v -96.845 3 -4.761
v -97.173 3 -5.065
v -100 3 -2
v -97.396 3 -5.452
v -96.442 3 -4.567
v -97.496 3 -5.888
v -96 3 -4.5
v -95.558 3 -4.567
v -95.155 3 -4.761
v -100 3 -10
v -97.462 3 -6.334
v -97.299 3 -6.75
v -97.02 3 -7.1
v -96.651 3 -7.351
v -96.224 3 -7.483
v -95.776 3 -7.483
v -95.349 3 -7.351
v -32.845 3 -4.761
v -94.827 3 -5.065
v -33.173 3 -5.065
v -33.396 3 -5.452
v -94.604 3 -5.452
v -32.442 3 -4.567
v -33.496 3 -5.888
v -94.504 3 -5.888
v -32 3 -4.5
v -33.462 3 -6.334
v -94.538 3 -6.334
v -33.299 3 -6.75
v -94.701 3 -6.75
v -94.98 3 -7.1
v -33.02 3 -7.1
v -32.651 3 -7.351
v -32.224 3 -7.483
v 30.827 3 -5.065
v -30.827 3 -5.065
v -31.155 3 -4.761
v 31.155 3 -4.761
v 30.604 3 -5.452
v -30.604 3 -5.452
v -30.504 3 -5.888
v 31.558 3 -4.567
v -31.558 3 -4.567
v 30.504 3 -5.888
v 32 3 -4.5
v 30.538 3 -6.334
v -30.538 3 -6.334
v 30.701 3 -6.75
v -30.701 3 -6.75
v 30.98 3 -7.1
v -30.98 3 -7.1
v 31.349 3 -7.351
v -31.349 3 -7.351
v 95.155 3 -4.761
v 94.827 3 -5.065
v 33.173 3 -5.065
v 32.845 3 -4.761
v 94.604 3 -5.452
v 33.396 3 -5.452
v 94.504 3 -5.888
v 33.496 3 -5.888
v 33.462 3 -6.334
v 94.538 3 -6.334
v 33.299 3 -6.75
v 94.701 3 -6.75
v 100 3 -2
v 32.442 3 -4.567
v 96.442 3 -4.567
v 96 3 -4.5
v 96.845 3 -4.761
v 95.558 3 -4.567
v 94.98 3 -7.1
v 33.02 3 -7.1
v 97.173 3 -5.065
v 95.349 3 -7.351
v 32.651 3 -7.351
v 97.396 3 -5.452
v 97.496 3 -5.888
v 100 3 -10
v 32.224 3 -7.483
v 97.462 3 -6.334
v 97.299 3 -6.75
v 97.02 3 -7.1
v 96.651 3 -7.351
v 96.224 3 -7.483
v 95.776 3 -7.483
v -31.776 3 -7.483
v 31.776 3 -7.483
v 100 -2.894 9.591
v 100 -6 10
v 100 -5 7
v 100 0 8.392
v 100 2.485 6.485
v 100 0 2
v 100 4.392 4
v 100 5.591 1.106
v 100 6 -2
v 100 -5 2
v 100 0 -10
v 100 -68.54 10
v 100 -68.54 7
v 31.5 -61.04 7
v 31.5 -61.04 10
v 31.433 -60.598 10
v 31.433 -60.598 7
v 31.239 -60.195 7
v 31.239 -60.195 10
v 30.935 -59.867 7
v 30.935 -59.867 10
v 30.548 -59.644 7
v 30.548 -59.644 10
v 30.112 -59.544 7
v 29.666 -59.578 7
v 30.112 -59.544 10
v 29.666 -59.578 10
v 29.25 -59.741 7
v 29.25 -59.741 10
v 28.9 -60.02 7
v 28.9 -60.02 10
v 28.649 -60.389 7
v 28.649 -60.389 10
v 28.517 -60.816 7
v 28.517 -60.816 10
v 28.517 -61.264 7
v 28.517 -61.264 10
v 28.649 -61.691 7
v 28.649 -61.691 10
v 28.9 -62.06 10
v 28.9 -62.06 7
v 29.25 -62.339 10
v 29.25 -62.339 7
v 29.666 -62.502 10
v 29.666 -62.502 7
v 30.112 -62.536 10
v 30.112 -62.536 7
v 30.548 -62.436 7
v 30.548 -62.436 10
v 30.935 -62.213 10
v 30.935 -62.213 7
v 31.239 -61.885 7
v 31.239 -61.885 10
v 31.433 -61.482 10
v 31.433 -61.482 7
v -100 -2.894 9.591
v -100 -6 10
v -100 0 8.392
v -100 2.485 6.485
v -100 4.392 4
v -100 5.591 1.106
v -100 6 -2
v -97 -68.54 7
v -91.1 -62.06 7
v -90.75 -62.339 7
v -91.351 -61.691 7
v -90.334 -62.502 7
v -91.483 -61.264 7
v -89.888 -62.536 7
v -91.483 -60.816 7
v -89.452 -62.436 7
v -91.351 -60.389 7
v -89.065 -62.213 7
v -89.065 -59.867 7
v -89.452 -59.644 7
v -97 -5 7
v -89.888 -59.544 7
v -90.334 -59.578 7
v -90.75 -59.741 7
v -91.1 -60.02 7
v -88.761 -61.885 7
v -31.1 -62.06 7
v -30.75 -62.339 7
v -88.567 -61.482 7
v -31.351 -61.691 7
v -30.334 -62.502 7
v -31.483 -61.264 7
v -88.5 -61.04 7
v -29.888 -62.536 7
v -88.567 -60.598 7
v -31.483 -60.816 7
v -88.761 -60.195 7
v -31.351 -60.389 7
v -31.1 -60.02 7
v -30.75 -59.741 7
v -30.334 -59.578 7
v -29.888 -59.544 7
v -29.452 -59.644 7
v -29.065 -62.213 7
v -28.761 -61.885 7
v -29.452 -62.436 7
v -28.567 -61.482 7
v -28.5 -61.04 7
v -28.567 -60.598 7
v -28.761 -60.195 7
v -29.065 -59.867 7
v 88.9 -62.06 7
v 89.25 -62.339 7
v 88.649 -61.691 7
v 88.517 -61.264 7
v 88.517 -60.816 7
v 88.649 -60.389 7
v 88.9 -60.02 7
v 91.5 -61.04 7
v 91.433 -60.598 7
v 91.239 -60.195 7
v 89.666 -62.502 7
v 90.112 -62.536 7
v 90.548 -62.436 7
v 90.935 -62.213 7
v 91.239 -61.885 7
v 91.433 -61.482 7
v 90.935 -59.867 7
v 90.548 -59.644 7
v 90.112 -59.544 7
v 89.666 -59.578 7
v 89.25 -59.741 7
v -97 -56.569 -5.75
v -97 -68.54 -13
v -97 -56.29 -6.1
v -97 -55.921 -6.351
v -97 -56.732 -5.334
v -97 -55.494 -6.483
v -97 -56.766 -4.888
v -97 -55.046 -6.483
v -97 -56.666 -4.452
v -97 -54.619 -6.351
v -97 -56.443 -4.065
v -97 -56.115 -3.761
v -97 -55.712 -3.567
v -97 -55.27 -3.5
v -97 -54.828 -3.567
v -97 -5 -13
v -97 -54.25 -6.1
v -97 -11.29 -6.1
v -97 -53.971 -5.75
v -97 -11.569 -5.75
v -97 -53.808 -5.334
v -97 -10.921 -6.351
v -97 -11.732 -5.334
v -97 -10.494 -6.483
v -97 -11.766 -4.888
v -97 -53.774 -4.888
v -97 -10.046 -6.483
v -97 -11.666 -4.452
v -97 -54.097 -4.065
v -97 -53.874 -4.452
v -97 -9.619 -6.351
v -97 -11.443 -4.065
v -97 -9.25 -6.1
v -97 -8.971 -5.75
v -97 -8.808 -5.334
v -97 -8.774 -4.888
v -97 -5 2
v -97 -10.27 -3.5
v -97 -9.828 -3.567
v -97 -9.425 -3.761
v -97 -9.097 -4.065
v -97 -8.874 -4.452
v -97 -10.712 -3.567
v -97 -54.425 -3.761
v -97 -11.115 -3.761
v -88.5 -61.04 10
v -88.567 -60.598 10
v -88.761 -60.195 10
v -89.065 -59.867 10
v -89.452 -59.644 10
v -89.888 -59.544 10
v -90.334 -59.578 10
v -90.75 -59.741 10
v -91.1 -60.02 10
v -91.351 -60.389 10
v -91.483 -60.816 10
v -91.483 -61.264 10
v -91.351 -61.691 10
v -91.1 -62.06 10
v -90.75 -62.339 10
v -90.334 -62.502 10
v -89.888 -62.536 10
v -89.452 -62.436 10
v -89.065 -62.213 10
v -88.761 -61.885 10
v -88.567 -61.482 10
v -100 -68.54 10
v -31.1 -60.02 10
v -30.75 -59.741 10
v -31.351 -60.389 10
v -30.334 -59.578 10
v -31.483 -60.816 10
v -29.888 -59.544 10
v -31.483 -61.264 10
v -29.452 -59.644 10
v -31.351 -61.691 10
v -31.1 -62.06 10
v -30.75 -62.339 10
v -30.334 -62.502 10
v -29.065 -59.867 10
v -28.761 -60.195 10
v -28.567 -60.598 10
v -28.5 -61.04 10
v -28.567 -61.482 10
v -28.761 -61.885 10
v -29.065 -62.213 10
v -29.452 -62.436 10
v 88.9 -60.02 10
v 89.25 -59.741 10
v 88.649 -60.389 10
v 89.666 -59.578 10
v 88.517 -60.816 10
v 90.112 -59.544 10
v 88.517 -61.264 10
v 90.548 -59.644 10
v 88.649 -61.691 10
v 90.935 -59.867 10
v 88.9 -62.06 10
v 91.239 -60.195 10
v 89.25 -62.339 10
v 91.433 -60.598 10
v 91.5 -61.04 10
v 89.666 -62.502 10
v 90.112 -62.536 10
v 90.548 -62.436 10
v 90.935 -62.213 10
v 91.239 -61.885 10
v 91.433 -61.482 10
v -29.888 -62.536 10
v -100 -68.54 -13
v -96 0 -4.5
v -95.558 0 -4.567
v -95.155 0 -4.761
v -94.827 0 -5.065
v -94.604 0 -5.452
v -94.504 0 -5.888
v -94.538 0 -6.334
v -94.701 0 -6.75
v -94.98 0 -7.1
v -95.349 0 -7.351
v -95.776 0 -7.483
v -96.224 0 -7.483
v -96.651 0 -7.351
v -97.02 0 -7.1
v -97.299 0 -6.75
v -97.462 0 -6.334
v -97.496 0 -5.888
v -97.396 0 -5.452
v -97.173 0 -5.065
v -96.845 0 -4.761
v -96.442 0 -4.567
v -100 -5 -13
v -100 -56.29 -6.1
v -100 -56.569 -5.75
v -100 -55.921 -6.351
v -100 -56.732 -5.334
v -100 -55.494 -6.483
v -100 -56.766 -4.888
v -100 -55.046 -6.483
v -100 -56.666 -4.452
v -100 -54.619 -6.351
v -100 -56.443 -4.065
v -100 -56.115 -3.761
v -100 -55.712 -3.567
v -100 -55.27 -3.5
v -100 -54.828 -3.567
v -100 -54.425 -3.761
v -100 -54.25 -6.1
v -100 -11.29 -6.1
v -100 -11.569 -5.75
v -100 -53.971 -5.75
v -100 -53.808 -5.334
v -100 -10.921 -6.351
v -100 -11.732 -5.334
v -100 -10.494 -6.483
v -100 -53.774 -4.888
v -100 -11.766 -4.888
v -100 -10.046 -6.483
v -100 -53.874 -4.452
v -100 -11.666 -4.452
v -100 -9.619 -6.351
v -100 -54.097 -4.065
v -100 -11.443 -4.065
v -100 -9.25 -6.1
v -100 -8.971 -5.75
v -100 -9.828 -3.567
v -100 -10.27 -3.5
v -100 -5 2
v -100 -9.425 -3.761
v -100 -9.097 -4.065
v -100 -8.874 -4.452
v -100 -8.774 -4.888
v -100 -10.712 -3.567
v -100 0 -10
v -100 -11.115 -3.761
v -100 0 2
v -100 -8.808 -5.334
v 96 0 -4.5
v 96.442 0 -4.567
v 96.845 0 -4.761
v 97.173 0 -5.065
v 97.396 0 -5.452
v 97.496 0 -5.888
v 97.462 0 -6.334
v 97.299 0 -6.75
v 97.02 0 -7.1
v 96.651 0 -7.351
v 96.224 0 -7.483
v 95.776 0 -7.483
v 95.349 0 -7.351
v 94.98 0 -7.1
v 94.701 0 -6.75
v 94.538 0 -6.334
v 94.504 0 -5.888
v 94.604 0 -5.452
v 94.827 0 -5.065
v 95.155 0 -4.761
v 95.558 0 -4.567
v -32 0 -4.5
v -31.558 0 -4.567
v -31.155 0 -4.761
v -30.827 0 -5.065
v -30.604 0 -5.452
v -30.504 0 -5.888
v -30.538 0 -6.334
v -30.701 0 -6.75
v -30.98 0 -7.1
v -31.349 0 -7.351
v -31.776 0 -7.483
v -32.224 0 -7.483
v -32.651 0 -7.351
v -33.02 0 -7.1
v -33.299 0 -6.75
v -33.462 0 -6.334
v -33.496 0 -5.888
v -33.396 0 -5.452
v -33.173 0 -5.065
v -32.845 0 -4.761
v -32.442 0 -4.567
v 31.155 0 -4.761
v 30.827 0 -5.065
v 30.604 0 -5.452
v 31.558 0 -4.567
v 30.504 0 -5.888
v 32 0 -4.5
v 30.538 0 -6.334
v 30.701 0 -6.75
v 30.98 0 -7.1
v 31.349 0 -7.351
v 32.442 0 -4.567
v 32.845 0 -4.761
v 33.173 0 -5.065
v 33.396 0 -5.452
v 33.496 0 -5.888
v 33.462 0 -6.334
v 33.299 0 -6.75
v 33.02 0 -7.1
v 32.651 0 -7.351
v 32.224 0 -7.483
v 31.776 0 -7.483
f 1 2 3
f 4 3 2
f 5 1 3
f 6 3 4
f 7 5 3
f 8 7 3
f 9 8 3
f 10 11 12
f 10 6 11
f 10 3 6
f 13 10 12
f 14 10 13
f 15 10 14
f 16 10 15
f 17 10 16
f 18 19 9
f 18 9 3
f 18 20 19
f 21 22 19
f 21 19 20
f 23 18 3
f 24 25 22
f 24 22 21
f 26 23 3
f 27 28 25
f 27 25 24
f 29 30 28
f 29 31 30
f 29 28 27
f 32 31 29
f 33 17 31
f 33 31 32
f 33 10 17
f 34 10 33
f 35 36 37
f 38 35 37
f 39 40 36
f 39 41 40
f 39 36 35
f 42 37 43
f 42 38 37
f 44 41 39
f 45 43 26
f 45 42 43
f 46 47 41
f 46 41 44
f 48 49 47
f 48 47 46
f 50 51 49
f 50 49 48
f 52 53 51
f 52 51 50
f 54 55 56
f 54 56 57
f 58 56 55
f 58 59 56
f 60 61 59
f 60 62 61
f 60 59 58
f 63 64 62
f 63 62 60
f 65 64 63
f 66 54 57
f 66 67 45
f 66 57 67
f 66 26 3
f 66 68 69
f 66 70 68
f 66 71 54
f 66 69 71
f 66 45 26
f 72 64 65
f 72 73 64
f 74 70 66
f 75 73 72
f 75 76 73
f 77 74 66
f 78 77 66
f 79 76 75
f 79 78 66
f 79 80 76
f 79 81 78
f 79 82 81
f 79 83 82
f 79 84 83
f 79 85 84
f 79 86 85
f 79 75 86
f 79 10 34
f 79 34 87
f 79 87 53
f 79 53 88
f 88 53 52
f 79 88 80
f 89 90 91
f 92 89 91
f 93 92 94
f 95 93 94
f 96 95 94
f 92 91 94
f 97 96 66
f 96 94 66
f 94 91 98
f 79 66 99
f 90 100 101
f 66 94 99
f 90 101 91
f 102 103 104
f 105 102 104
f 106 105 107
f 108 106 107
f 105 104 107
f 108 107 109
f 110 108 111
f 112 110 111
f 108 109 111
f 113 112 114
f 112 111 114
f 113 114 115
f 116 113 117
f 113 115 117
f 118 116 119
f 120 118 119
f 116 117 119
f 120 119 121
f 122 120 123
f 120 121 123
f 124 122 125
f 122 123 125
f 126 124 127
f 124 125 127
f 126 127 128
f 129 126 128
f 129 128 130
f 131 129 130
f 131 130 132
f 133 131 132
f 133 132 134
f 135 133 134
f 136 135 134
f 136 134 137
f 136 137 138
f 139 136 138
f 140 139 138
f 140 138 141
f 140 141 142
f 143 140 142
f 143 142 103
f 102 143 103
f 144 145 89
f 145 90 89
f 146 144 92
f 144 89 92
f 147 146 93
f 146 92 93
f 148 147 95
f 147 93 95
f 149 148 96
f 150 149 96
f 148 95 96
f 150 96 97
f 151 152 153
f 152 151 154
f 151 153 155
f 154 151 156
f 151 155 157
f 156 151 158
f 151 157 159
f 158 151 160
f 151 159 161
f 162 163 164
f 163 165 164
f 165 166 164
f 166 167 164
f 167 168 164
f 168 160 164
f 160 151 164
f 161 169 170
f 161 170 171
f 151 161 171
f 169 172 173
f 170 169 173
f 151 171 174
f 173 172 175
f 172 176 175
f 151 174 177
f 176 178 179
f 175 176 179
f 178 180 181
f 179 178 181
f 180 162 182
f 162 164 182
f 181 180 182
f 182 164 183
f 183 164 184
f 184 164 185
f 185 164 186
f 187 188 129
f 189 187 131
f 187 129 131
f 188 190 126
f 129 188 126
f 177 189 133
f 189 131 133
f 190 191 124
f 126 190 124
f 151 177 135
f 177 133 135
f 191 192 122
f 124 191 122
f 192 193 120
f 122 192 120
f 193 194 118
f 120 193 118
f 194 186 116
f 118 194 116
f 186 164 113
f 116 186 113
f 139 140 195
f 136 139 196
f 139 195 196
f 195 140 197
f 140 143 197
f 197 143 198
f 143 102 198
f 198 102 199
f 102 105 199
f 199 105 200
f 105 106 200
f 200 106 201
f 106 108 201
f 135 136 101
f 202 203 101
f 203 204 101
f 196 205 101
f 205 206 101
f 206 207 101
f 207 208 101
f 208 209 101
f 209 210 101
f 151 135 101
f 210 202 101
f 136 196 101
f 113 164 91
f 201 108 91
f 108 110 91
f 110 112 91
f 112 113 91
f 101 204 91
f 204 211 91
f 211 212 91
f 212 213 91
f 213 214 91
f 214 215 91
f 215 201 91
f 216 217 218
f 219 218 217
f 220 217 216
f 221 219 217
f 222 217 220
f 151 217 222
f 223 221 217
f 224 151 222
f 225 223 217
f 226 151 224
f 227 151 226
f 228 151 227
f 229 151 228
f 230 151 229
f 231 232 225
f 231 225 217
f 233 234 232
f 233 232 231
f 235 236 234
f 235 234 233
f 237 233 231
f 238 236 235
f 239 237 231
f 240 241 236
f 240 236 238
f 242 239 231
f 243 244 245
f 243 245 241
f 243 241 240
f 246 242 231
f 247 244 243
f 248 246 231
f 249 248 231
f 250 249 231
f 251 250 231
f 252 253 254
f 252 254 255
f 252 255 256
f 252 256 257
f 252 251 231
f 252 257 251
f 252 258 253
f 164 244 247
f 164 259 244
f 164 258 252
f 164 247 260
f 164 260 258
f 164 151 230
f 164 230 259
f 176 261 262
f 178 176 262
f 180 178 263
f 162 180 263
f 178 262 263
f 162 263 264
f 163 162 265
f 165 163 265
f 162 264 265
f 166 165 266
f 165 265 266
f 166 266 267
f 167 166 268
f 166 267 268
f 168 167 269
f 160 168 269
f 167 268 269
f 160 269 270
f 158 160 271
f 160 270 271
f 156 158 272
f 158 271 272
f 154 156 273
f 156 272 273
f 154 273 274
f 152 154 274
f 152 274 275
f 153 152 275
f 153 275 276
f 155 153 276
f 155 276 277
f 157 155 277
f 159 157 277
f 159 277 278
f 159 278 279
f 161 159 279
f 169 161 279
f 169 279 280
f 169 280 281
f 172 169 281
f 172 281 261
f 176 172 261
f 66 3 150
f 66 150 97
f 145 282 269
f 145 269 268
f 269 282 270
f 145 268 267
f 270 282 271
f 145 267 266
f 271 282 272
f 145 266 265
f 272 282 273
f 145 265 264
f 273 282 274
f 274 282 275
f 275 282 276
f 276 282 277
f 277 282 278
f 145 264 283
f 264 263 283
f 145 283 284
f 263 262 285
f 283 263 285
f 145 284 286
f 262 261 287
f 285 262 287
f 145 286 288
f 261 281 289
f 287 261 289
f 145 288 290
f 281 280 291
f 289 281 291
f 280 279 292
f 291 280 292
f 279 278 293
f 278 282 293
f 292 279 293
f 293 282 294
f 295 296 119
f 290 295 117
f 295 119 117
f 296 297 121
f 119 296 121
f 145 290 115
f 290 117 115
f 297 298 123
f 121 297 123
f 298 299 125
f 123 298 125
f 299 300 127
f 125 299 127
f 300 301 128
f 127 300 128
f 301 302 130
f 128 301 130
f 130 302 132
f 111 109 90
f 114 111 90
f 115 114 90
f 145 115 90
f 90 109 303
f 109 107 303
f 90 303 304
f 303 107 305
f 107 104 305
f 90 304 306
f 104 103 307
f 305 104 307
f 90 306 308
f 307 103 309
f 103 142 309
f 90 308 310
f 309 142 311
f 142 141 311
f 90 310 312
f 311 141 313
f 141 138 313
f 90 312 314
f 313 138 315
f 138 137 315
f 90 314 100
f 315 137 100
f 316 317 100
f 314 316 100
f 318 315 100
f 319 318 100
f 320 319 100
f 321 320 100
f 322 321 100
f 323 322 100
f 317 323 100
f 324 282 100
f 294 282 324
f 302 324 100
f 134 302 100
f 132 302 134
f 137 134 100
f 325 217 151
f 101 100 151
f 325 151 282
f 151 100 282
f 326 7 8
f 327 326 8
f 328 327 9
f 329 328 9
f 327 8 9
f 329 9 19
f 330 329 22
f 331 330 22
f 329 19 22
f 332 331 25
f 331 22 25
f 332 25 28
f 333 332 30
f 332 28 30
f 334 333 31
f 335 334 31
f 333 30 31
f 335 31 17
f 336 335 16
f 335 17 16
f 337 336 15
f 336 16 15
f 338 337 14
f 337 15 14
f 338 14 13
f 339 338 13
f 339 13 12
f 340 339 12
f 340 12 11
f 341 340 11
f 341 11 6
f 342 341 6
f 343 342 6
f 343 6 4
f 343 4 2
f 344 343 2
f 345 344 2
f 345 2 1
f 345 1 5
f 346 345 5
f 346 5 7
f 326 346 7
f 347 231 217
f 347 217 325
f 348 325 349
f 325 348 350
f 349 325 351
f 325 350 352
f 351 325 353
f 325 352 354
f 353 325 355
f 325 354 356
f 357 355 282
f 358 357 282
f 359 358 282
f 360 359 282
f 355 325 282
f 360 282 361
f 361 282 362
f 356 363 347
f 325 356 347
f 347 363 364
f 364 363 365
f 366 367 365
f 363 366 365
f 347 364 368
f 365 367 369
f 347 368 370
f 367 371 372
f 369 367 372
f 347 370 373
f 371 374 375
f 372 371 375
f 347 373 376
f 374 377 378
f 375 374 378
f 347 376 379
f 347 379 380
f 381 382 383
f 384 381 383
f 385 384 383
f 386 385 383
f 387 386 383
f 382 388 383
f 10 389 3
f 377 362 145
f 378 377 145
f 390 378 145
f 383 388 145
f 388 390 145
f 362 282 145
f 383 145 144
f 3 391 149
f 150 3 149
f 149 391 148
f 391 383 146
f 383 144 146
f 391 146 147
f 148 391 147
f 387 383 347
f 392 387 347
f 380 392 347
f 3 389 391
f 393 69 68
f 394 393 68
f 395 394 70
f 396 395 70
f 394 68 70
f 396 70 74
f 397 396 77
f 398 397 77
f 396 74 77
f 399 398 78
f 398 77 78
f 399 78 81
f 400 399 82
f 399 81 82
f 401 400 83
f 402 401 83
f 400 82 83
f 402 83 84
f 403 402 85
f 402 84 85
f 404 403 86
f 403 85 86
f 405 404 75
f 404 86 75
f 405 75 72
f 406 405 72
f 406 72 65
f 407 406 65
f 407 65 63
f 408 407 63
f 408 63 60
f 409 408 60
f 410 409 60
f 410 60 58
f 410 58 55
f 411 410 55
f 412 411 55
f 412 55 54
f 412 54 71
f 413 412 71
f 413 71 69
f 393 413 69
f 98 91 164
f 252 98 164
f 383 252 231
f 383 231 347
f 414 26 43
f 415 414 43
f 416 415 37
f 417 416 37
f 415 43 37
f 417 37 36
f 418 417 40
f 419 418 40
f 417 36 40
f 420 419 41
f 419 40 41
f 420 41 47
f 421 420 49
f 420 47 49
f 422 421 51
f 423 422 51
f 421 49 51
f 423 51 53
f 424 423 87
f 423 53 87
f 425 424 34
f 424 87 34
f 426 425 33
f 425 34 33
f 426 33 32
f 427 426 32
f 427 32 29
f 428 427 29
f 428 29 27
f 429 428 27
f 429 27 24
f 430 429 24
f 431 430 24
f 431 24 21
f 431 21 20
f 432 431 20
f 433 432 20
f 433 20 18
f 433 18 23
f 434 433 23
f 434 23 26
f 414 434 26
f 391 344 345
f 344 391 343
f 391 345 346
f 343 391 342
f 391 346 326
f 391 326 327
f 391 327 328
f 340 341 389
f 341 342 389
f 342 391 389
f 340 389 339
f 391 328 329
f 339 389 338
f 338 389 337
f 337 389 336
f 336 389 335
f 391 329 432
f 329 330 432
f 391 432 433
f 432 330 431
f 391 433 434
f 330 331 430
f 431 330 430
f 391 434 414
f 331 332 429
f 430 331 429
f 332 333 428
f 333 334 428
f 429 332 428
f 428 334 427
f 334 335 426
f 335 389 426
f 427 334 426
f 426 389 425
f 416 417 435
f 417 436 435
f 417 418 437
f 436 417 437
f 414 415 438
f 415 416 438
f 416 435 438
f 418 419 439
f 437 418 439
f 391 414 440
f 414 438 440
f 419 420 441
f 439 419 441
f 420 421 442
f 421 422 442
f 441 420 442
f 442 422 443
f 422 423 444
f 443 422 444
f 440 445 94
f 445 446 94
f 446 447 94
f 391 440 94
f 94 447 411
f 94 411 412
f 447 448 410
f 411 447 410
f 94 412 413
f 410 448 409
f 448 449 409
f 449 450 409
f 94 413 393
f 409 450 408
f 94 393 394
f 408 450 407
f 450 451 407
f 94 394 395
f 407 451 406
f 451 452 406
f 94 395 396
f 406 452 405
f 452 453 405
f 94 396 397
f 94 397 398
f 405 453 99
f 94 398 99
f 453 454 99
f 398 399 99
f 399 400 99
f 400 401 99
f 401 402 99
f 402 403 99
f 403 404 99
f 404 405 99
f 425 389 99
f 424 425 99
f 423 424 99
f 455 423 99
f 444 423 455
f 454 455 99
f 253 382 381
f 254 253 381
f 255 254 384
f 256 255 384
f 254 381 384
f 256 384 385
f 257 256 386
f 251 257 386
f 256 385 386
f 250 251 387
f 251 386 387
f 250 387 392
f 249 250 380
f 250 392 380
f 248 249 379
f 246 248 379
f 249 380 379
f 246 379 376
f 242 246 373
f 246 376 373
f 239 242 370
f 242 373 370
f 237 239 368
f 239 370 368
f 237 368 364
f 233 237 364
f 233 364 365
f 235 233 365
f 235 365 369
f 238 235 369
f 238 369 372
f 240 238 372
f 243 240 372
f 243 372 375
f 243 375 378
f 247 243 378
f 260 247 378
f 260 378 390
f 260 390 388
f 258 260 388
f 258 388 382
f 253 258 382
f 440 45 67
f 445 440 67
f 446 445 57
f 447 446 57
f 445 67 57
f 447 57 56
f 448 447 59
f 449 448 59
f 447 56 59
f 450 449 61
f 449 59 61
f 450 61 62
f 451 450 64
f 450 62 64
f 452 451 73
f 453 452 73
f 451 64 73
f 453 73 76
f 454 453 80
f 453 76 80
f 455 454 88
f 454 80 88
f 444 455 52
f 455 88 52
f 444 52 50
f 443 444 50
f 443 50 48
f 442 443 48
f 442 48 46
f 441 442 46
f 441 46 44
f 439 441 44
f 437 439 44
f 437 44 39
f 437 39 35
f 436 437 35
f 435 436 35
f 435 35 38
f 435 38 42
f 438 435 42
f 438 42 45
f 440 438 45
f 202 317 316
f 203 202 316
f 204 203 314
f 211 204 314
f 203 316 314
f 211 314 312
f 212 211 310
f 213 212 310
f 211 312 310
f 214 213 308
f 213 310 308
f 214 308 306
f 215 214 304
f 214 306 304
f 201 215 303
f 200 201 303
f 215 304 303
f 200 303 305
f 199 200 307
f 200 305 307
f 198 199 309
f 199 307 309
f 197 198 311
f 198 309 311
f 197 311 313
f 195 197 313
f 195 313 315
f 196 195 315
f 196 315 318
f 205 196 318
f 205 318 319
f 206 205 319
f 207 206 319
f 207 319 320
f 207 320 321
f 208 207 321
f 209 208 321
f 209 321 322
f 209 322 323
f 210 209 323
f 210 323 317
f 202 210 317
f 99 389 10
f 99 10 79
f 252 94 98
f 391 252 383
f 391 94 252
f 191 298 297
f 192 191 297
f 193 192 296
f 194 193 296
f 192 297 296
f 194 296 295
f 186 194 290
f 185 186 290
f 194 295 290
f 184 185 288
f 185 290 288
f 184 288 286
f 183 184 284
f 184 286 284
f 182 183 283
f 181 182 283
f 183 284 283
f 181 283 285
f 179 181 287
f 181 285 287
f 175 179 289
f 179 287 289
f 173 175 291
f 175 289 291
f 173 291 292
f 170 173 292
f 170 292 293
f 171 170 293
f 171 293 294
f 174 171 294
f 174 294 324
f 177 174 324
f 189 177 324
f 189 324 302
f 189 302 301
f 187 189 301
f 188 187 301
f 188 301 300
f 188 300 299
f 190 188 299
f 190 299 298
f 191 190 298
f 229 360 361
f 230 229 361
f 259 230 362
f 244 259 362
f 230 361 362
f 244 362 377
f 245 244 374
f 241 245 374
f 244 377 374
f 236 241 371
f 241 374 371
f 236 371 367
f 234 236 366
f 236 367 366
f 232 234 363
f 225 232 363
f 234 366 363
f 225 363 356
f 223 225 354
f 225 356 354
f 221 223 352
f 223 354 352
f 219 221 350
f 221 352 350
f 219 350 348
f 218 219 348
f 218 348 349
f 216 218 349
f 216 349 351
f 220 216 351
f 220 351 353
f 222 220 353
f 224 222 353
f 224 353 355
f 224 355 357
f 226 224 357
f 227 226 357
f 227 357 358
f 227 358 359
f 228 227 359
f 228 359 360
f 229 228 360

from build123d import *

# Parameters (mm, degrees)
SKETCH1_W           = 200
SKETCH1_H           = 20
BOSS_EXTRUDE1_DEPTH = 3
CUT_EXTRUDE1_REACH  = 102.544
SKETCH2_R           = 1.5
LPATTERN1_COUNT     = 4
LPATTERN1_PITCH     = 64
SKETCH3_W           = 200
SKETCH3_H           = 3
BOSS_EXTRUDE2_DEPTH = 68.54
SKETCH4_W           = 200
SKETCH4_H           = 5
BOSS_EXTRUDE3_DEPTH = 5
SKETCH5_W           = 200
SKETCH5_H           = 12
BOSS_EXTRUDE4_DEPTH = 3
FILLET4_R           = 12
SKETCH6_W           = 3
SKETCH6_H           = 63.54
BOSS_EXTRUDE5_DEPTH = 20
CUT_EXTRUDE2_REACH  = 213.818
SKETCH7_R           = 1.5
CUT_EXTRUDE3_REACH  = 125.397
SKETCH8_R           = 1.5
LPATTERN2_COUNT     = 4
LPATTERN2_PITCH     = 60


with BuildPart() as part:
    # Sketch1 → Boss-Extrude1 (new body)
    with BuildSketch(Plane(origin=(0, 0, 0), x_dir=(1, 0, 0), z_dir=(0, 1, 0))):
        Rectangle(SKETCH1_W, SKETCH1_H)
    extrude(amount=BOSS_EXTRUDE1_DEPTH)

    # Sketch2 → Cut-Extrude1 (cut, up to next)
    with BuildSketch(Plane(origin=(0, 3, 0), x_dir=(1, 0, 0), z_dir=(0, 1, 0)), mode=Mode.PRIVATE) as cut_extrude1_sk1:
        with Locations(Location((-96, 6, 0), (0, 0, 270))):
            Circle(SKETCH2_R)
    cut_extrude1_tool1 = extrude(cut_extrude1_sk1.sketch, amount=-CUT_EXTRUDE1_REACH, mode=Mode.PRIVATE) & part.part
    cut_extrude1 = cut_extrude1_tool1.solids().sort_by_distance((-96, 3, -6))[0]
    add(cut_extrude1, mode=Mode.SUBTRACT)

    # LPattern1: Cut-Extrude1 ×4
    with Locations(*[(i * LPATTERN1_PITCH, 0, 0) for i in range(1, LPATTERN1_COUNT)]):
        add(cut_extrude1, mode=Mode.SUBTRACT)

    # Sketch3 → Boss-Extrude2 (add)
    with BuildSketch(Plane.XZ):
        with Locations((0, 8.5)):
            Rectangle(SKETCH3_W, SKETCH3_H)
    extrude(amount=BOSS_EXTRUDE2_DEPTH)

    # Sketch4 → Boss-Extrude3 (add)
    with BuildSketch(Plane(origin=(0, 0, 7), x_dir=(-1, 0, 0), z_dir=(0, 0, -1))):
        with Locations((0, -2.5)):
            Rectangle(SKETCH4_W, SKETCH4_H)
    extrude(amount=BOSS_EXTRUDE3_DEPTH)

    # Sketch5 → Boss-Extrude4 (add)
    with BuildSketch(Plane(origin=(0, 3, 0), x_dir=(1, 0, 0), z_dir=(0, 1, 0))):
        with Locations((0, -4)):
            Rectangle(SKETCH5_W, SKETCH5_H)
    extrude(amount=BOSS_EXTRUDE4_DEPTH)

    # Fillet4
    fillet4_edges = [part.edges().sort_by_distance(p)[0] for p in [
        (0, 6, 10),
    ]]
    fillet(fillet4_edges, radius=FILLET4_R - 0.0001)  # a hair under: the kernel refuses the full size

    # Sketch6 → Boss-Extrude5 (add)
    with BuildSketch(Plane(origin=(0, 0, 7), x_dir=(-1, 0, 0), z_dir=(0, 0, -1))):
        with Locations((98.5, -36.77)):
            Rectangle(SKETCH6_W, SKETCH6_H)
    extrude(amount=BOSS_EXTRUDE5_DEPTH)

    # Sketch7 → Cut-Extrude2 (cut, up to next)
    with BuildSketch(Plane.ZY.offset(100), mode=Mode.PRIVATE) as cut_extrude2_sk1:
        with Locations((-5, -10.27)):
            Circle(SKETCH7_R)
    cut_extrude2_tool1 = extrude(cut_extrude2_sk1.sketch, amount=-CUT_EXTRUDE2_REACH, mode=Mode.PRIVATE) & part.part
    # Sketch7 → Cut-Extrude2 (cut, up to next)
    with BuildSketch(Plane.ZY.offset(100), mode=Mode.PRIVATE) as cut_extrude2_sk2:
        with Locations((-5, -55.27)):
            Circle(SKETCH7_R)
    cut_extrude2_tool2 = extrude(cut_extrude2_sk2.sketch, amount=-CUT_EXTRUDE2_REACH, mode=Mode.PRIVATE) & part.part
    add(cut_extrude2_tool1.solids().sort_by_distance((-100, -10.27, -5))[0], mode=Mode.SUBTRACT)
    add(cut_extrude2_tool2.solids().sort_by_distance((-100, -55.27, -5))[0], mode=Mode.SUBTRACT)

    # Sketch8 → Cut-Extrude3 (cut, up to next)
    with BuildSketch(Plane.XY.offset(10), mode=Mode.PRIVATE) as cut_extrude3_sk1:
        with Locations((-90, -61.04)):
            Circle(SKETCH8_R)
    cut_extrude3_tool1 = extrude(cut_extrude3_sk1.sketch, amount=-CUT_EXTRUDE3_REACH, mode=Mode.PRIVATE) & part.part
    cut_extrude3 = cut_extrude3_tool1.solids().sort_by_distance((-90, -61.04, 10))[0]
    add(cut_extrude3, mode=Mode.SUBTRACT)

    # LPattern2: Cut-Extrude3 ×4
    with Locations(*[(i * LPATTERN2_PITCH, 0, 0) for i in range(1, LPATTERN2_COUNT)]):
        add(cut_extrude3, mode=Mode.SUBTRACT)


solid = part.part
